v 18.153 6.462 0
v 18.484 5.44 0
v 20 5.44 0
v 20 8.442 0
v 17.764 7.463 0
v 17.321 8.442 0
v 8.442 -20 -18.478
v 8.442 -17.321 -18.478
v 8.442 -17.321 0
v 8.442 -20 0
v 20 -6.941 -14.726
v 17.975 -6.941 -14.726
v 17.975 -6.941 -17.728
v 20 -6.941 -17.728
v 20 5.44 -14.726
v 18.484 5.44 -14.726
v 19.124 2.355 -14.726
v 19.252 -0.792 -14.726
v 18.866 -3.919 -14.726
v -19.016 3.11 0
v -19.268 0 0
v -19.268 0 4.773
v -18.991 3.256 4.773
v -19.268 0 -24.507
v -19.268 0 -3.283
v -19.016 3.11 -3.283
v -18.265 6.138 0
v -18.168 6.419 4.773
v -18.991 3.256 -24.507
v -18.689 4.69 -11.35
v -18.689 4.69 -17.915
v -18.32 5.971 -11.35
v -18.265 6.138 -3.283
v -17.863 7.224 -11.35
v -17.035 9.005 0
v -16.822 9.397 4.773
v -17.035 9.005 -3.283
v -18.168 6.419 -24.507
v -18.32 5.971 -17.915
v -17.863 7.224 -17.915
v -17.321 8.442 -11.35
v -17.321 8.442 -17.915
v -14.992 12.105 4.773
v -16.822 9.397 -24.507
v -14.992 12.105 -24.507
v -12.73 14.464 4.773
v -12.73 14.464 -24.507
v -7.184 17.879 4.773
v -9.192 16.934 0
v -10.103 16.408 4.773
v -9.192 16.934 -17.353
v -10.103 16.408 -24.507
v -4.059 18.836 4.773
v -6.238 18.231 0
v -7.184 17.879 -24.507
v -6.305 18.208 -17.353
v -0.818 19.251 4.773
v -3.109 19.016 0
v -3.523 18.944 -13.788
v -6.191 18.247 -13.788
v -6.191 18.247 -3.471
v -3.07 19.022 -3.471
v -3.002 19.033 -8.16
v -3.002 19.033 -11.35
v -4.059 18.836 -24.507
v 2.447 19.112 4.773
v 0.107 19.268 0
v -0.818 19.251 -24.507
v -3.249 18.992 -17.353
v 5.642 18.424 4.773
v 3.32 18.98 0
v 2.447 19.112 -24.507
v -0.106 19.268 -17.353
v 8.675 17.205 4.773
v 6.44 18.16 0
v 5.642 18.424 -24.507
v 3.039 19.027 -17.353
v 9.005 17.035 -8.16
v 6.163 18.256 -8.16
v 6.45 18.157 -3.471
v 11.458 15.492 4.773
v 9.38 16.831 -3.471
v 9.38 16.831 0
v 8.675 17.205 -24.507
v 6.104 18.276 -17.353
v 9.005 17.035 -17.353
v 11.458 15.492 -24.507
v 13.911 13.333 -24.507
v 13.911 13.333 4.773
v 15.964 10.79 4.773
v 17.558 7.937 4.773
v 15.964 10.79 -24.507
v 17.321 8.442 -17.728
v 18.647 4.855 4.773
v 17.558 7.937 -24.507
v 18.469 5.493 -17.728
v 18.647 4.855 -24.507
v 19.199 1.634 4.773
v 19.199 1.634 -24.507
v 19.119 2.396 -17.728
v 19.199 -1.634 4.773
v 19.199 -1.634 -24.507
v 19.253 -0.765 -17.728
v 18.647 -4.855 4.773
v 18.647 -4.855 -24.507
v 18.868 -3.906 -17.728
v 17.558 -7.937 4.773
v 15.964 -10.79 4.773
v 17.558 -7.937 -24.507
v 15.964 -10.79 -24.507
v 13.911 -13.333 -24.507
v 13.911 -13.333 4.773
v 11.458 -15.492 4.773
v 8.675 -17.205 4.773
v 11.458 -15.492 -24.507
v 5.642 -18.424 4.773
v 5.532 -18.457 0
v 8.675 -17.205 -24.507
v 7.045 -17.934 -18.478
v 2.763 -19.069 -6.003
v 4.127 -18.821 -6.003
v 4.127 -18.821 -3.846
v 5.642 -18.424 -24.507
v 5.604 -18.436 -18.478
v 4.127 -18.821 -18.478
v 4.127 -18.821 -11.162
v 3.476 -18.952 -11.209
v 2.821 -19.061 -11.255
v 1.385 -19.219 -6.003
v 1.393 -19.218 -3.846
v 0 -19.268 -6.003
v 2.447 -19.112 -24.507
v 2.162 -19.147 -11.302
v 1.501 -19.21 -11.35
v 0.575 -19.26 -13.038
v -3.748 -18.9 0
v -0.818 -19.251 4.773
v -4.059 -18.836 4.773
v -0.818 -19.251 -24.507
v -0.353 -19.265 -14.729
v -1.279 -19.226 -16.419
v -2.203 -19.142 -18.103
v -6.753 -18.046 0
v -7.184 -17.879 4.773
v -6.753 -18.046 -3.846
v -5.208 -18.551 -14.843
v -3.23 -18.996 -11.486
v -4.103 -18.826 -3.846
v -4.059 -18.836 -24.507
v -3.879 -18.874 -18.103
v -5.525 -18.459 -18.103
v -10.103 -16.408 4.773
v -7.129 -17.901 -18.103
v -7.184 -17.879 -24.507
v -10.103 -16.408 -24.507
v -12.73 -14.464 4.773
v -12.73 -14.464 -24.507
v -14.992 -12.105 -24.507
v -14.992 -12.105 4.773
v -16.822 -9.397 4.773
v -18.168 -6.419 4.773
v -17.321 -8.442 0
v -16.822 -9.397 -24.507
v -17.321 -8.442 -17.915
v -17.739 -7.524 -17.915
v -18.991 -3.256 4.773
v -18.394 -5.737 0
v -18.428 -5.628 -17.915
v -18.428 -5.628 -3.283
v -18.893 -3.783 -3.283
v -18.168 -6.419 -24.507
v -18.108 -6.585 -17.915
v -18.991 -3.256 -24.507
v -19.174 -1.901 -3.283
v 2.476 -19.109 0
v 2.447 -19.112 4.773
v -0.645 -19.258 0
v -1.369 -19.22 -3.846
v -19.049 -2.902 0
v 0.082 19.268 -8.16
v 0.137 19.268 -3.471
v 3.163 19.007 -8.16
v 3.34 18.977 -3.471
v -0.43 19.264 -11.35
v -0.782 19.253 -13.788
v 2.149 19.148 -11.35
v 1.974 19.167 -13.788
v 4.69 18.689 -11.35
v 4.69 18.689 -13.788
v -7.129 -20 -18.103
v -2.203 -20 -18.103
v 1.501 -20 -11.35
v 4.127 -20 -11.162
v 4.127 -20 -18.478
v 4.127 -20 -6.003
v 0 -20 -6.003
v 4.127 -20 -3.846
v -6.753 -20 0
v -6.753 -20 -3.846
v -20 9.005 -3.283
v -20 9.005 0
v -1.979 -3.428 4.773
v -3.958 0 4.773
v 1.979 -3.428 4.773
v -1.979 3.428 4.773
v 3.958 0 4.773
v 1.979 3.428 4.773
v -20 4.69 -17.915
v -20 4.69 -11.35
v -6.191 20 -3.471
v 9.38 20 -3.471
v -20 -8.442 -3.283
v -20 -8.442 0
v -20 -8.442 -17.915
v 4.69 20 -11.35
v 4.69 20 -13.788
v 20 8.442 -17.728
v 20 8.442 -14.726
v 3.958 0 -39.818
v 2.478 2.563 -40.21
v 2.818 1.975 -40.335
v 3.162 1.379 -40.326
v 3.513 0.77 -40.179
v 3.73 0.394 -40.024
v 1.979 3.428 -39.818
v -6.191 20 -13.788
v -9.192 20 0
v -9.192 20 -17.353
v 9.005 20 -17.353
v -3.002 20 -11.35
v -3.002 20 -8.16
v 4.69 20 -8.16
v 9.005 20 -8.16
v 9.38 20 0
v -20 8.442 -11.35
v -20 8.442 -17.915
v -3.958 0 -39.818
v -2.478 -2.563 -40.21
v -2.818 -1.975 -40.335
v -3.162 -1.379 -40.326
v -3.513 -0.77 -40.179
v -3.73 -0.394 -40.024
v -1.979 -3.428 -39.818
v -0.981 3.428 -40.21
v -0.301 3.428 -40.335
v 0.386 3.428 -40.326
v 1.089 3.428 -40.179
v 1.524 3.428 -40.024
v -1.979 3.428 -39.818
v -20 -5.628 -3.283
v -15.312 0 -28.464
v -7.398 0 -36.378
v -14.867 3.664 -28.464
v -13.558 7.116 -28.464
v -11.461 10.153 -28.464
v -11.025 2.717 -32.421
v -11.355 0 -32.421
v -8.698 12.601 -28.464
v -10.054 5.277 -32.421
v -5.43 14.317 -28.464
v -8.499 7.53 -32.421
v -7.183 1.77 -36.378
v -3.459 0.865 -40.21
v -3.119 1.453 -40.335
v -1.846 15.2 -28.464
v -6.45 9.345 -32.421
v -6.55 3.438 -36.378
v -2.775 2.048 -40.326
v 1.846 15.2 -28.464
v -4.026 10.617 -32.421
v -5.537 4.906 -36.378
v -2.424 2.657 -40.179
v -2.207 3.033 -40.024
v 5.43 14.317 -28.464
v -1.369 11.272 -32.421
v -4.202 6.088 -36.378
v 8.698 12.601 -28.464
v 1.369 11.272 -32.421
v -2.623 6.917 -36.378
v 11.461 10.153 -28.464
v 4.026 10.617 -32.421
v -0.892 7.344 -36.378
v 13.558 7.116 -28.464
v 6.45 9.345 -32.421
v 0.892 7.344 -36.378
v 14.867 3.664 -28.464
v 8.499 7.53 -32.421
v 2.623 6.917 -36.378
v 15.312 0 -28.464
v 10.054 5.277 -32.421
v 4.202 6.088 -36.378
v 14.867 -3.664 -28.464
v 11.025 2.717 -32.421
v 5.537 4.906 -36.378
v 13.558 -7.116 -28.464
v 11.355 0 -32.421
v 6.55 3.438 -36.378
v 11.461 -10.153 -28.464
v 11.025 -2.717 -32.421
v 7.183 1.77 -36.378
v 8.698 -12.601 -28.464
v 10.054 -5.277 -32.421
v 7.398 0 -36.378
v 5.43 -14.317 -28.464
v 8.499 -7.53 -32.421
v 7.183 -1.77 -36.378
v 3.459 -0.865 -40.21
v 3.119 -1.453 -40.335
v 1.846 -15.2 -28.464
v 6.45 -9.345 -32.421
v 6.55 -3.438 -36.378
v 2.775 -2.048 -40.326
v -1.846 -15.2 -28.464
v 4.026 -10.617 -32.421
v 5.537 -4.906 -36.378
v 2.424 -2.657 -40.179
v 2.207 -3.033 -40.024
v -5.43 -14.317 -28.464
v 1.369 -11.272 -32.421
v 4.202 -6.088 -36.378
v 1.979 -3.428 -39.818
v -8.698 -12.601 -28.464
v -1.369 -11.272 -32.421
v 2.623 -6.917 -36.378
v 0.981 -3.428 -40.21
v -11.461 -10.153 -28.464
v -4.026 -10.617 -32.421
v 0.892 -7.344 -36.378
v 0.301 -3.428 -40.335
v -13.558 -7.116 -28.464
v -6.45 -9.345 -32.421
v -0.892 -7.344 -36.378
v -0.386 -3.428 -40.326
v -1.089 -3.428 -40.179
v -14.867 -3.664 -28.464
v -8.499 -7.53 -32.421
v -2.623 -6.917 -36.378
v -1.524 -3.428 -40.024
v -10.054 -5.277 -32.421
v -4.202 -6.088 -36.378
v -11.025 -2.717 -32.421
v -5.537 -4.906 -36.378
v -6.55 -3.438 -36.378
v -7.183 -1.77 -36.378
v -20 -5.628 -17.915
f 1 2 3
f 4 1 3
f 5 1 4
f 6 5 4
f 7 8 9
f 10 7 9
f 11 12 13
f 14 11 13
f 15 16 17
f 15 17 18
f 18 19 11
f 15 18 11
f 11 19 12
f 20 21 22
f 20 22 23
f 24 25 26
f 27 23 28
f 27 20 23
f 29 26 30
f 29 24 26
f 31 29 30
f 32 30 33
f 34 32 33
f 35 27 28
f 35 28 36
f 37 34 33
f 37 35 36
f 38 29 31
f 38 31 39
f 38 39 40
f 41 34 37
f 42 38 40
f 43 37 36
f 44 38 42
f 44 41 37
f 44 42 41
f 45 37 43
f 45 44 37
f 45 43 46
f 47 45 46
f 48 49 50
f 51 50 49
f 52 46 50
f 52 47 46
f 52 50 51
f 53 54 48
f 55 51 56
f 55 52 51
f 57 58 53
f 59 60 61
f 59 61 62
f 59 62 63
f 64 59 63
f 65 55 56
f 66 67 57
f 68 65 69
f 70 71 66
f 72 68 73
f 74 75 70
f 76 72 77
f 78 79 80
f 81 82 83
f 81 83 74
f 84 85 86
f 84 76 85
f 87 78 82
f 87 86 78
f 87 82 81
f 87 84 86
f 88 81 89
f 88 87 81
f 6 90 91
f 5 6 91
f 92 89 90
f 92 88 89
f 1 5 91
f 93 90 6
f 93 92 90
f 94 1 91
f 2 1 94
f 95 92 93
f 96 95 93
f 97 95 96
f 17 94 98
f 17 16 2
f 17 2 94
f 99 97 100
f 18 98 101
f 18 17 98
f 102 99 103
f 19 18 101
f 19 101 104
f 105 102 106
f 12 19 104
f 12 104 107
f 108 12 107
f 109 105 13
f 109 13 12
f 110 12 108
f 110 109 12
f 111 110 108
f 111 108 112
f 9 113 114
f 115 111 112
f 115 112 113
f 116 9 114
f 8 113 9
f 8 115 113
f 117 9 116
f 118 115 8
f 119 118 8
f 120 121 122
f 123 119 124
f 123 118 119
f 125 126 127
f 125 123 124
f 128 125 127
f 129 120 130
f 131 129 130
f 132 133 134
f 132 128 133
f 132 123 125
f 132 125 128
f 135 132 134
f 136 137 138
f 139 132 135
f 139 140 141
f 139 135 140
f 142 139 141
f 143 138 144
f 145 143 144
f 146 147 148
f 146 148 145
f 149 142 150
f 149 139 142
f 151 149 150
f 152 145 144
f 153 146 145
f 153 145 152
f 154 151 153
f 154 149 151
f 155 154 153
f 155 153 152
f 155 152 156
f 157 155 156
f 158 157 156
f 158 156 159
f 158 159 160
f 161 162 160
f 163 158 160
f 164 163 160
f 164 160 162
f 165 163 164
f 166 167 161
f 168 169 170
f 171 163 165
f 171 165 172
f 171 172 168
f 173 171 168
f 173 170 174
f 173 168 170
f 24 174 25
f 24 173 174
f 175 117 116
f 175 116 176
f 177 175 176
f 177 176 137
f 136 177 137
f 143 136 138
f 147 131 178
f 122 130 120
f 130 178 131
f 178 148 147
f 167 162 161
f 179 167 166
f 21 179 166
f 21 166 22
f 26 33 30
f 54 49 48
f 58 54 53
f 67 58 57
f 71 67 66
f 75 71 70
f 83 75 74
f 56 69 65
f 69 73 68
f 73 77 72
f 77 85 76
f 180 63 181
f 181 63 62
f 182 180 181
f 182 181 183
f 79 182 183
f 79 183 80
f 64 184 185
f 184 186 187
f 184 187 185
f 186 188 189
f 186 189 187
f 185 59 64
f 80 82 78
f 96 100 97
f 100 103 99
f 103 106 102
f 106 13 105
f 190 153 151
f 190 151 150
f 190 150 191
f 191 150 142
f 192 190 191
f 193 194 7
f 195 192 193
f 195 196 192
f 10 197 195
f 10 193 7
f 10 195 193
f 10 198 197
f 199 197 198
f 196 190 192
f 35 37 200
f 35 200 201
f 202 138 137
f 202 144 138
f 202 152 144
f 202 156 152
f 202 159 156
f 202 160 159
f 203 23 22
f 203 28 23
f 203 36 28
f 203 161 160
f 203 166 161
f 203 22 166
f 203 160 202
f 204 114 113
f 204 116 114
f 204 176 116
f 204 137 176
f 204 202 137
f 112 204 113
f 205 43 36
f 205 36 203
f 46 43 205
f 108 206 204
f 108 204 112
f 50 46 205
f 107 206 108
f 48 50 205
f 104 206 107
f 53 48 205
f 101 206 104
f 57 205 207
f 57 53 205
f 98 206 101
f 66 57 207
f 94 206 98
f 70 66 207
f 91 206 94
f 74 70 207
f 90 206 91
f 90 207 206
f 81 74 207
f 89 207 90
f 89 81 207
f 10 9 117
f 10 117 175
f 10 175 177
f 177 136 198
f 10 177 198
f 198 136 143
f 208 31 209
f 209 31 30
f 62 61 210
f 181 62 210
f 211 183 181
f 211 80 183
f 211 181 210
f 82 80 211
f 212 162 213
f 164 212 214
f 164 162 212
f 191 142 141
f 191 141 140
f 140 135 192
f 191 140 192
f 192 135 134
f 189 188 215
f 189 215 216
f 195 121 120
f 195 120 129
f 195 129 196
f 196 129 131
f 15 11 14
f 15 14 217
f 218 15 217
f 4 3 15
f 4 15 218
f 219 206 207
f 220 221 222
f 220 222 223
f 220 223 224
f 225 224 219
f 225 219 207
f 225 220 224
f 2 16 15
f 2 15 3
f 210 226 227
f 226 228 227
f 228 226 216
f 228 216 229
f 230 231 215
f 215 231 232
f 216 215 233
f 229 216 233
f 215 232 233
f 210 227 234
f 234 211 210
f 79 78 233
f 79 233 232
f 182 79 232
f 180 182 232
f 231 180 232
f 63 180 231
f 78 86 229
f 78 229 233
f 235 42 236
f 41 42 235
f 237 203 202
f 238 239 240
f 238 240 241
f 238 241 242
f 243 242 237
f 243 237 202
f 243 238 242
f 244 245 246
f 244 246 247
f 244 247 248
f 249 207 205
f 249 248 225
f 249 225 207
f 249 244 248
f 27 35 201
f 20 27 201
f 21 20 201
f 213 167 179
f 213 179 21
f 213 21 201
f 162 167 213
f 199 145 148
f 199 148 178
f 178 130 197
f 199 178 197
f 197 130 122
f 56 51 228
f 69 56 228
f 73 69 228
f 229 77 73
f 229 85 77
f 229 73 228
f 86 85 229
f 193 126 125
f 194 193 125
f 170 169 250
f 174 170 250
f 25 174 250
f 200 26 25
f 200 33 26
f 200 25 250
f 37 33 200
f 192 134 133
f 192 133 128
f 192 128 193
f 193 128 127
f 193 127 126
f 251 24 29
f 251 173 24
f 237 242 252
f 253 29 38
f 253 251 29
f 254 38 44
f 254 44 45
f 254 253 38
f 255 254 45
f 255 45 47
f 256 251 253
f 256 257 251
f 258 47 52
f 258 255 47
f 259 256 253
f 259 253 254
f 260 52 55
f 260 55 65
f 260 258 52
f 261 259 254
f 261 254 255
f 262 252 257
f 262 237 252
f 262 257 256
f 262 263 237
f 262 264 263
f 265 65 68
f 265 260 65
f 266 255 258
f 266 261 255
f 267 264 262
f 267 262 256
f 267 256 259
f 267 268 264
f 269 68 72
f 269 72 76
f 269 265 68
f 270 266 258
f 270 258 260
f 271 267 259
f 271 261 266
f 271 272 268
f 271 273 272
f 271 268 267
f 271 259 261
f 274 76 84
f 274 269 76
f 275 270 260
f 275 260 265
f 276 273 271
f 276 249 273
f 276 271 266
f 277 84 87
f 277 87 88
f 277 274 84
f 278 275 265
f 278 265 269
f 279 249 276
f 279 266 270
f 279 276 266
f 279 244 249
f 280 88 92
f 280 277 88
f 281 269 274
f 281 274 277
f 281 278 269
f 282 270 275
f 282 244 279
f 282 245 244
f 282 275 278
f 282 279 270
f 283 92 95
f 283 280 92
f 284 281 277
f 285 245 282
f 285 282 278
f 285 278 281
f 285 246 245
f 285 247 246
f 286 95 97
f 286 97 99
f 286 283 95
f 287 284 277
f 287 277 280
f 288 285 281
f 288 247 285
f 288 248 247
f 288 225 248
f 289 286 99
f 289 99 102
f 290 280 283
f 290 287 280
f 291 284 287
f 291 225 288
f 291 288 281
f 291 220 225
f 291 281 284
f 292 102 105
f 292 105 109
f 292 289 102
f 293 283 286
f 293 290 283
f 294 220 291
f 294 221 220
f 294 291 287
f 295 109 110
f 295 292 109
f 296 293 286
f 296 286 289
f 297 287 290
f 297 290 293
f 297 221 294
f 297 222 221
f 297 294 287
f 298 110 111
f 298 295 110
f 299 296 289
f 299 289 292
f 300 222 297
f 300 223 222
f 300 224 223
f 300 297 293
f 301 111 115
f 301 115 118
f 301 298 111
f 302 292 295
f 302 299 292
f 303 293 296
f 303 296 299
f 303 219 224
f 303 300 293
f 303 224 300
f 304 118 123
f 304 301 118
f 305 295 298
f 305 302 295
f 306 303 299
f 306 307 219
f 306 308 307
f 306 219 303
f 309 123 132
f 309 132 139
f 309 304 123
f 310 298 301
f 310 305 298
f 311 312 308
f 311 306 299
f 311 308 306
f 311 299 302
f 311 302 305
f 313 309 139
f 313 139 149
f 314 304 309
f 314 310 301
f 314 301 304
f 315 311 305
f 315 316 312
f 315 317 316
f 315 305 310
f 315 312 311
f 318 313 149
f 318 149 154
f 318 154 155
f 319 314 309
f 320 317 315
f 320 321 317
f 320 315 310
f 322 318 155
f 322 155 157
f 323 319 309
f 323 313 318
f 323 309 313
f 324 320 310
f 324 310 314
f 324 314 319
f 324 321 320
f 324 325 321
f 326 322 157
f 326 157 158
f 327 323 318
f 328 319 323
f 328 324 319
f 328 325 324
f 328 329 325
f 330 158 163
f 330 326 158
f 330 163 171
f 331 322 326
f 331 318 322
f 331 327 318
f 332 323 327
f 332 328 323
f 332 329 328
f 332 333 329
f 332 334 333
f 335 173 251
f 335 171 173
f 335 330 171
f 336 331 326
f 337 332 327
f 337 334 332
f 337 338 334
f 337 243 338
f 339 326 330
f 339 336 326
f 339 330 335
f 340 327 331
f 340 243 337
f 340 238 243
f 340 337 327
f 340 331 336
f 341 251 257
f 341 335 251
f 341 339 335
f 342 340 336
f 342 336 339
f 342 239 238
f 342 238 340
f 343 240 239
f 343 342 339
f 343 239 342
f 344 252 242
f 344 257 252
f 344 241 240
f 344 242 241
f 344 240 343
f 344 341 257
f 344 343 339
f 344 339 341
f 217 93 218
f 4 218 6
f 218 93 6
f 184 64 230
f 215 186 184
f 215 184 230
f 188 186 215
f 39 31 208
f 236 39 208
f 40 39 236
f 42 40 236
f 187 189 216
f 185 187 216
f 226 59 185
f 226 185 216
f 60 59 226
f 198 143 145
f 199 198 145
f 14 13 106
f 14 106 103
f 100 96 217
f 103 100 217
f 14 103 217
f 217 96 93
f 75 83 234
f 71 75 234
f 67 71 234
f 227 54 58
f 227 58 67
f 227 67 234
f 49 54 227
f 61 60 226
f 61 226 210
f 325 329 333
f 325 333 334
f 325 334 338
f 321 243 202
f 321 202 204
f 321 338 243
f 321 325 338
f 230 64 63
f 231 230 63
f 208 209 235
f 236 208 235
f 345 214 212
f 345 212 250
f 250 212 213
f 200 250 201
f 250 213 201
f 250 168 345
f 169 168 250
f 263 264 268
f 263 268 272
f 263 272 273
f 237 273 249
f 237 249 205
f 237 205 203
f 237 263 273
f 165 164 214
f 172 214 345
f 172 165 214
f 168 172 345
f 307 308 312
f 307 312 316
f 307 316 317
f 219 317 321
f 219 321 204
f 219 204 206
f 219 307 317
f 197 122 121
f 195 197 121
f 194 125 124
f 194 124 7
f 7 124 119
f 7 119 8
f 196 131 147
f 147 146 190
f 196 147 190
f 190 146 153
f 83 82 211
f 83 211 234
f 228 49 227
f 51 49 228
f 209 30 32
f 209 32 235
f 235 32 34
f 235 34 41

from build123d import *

# Parameters (mm, degrees)
F4_DEPTH  = 71.64283
F3_W      = 3.0015474185
F3_H      = 14.726341702
F5_DEPTH  = 20
F6_W      = 2.8139539063
F6_H      = 14.6325449459
F6_W_2    = 3.7519335747
F6_H_2    = 6.5658856183
F7_DEPTH  = 20
F9_DEPTH  = 20
F10_W     = 7.6914660167
F10_H     = 3.1891446561
F11_DEPTH = 20
F12_DEPTH = 49.92346


with BuildPart() as f1:
    # F0 (on Front) → F1 (revolve)
    with BuildSketch(Plane.XZ):
        Polygon((0, -24.5069297566), (0, 4.7725648619), (-4.554358311, 4.7725648619), (-19.2684326321, 4.7725648619), (-19.2684326321, -24.5069297566), align=None)
        Polygon((0, -43.7753610313), (0, -24.5069297566), (-19.2684326321, -24.5069297566), align=None)
    revolve(axis=Axis((0, 0, -9.8671824473), (0, 0, -1)))

    # F2 (on Top) → F4 (cut)
    with BuildSketch(Plane.XY):
        Polygon((-1.9789263333, -3.4276009537), (1.9789263333, -3.4276009537), (3.9578526666, 0), (1.9789263333, 3.4276009537), (-1.9789263333, 3.4276009537), (-3.9578526666, 0), align=None)
    extrude(amount=F4_DEPTH, mode=Mode.SUBTRACT)

    # F3 (on Right) → F5 (join)
    with BuildSketch(Plane.YZ):
        with Locations((6.941080559, -7.363170851)):
            Rectangle(F3_W, F3_H)
        Polygon((8.4418542683, -17.7278891206), (8.4418542683, -14.726341702), (5.4403068498, -14.726341702), (-6.9410782307, -14.726341702), (-6.9410782307, -17.7278891206), align=None)
    extrude(amount=F5_DEPTH)

    # F6 (on Right) → F7 (join)
    with BuildSketch(Plane.YZ):
        Polygon((9.0046431869, -3.2829423435), (9.0046431869, 0), (-8.4418542683, 0), (-8.4418542683, -3.2829423435), (-5.627900362, -3.2829423435), align=None)
        with Locations((-7.0348773152, -10.5992148165)):
            Rectangle(F6_W, F6_H)
        with Locations((6.5658842213, -14.6325444803)):
            Rectangle(F6_W_2, F6_H_2)
    extrude(amount=-F7_DEPTH)

    # F8 (on Front) → F9 (join)
    with BuildSketch(Plane.XZ):
        Polygon((8.4418524057, 0), (-6.7534814589, 0), (-6.7534814589, -3.8457328919), (4.1271289811, -3.8457328919), (8.4418524057, -3.8457328919), align=None)
        Polygon((8.4418524057, -18.4782778379), (8.4418524057, -3.8457328919), (4.1271289811, -3.8457328919), (4.1271289811, -6.0030948953), (4.1271289811, -11.1620053649), (4.1271289811, -18.4782778379), align=None)
        Polygon((4.1271289811, -11.1620053649), (4.1271289811, -6.0030948953), (0, -6.0030948953), (-7.1286750026, -18.1030835956), (-2.2027484971, -18.1030835956), (1.5007748734, -11.3496016711), align=None)
    extrude(amount=F9_DEPTH)

    # F10 (on Front) → F11 (join)
    with BuildSketch(Plane.XZ):
        Polygon((9.3798367307, -3.4705393482), (9.3798367307, 0), (-9.1922413558, 0), (-9.1922413558, -3.4705393482), (-6.1906939372, -3.4705393482), align=None)
        Polygon((-6.1906939372, -3.4705393482), (-9.1922413558, -3.4705393482), (-9.1922413558, -17.3526965082), (-6.1906939372, -17.3526965082), (-6.1906939372, -13.7883592397), align=None)
        Polygon((4.689917434, -13.7883592397), (-6.1906939372, -13.7883592397), (-6.1906939372, -17.3526965082), (9.0046431869, -17.3526965082), (9.0046431869, -13.7883592397), align=None)
        Polygon((4.689917434, -11.3496016711), (4.689917434, -13.7883592397), (9.0046431869, -13.7883592397), (9.0046431869, -8.160457015), (4.689917434, -8.160457015), align=None)
        with Locations((0.8441844257, -9.7550293431)):
            Rectangle(F10_W, F10_H)
    extrude(amount=-F11_DEPTH)

    # F2 (on Top) → F12 (cut)
    with BuildSketch(Plane.XY):
        Polygon((-1.9789263333, -3.4276009537), (1.9789263333, -3.4276009537), (3.9578526666, 0), (1.9789263333, 3.4276009537), (-1.9789263333, 3.4276009537), (-3.9578526666, 0), align=None)
    extrude(amount=-F12_DEPTH, mode=Mode.SUBTRACT)


solid = f1.part
